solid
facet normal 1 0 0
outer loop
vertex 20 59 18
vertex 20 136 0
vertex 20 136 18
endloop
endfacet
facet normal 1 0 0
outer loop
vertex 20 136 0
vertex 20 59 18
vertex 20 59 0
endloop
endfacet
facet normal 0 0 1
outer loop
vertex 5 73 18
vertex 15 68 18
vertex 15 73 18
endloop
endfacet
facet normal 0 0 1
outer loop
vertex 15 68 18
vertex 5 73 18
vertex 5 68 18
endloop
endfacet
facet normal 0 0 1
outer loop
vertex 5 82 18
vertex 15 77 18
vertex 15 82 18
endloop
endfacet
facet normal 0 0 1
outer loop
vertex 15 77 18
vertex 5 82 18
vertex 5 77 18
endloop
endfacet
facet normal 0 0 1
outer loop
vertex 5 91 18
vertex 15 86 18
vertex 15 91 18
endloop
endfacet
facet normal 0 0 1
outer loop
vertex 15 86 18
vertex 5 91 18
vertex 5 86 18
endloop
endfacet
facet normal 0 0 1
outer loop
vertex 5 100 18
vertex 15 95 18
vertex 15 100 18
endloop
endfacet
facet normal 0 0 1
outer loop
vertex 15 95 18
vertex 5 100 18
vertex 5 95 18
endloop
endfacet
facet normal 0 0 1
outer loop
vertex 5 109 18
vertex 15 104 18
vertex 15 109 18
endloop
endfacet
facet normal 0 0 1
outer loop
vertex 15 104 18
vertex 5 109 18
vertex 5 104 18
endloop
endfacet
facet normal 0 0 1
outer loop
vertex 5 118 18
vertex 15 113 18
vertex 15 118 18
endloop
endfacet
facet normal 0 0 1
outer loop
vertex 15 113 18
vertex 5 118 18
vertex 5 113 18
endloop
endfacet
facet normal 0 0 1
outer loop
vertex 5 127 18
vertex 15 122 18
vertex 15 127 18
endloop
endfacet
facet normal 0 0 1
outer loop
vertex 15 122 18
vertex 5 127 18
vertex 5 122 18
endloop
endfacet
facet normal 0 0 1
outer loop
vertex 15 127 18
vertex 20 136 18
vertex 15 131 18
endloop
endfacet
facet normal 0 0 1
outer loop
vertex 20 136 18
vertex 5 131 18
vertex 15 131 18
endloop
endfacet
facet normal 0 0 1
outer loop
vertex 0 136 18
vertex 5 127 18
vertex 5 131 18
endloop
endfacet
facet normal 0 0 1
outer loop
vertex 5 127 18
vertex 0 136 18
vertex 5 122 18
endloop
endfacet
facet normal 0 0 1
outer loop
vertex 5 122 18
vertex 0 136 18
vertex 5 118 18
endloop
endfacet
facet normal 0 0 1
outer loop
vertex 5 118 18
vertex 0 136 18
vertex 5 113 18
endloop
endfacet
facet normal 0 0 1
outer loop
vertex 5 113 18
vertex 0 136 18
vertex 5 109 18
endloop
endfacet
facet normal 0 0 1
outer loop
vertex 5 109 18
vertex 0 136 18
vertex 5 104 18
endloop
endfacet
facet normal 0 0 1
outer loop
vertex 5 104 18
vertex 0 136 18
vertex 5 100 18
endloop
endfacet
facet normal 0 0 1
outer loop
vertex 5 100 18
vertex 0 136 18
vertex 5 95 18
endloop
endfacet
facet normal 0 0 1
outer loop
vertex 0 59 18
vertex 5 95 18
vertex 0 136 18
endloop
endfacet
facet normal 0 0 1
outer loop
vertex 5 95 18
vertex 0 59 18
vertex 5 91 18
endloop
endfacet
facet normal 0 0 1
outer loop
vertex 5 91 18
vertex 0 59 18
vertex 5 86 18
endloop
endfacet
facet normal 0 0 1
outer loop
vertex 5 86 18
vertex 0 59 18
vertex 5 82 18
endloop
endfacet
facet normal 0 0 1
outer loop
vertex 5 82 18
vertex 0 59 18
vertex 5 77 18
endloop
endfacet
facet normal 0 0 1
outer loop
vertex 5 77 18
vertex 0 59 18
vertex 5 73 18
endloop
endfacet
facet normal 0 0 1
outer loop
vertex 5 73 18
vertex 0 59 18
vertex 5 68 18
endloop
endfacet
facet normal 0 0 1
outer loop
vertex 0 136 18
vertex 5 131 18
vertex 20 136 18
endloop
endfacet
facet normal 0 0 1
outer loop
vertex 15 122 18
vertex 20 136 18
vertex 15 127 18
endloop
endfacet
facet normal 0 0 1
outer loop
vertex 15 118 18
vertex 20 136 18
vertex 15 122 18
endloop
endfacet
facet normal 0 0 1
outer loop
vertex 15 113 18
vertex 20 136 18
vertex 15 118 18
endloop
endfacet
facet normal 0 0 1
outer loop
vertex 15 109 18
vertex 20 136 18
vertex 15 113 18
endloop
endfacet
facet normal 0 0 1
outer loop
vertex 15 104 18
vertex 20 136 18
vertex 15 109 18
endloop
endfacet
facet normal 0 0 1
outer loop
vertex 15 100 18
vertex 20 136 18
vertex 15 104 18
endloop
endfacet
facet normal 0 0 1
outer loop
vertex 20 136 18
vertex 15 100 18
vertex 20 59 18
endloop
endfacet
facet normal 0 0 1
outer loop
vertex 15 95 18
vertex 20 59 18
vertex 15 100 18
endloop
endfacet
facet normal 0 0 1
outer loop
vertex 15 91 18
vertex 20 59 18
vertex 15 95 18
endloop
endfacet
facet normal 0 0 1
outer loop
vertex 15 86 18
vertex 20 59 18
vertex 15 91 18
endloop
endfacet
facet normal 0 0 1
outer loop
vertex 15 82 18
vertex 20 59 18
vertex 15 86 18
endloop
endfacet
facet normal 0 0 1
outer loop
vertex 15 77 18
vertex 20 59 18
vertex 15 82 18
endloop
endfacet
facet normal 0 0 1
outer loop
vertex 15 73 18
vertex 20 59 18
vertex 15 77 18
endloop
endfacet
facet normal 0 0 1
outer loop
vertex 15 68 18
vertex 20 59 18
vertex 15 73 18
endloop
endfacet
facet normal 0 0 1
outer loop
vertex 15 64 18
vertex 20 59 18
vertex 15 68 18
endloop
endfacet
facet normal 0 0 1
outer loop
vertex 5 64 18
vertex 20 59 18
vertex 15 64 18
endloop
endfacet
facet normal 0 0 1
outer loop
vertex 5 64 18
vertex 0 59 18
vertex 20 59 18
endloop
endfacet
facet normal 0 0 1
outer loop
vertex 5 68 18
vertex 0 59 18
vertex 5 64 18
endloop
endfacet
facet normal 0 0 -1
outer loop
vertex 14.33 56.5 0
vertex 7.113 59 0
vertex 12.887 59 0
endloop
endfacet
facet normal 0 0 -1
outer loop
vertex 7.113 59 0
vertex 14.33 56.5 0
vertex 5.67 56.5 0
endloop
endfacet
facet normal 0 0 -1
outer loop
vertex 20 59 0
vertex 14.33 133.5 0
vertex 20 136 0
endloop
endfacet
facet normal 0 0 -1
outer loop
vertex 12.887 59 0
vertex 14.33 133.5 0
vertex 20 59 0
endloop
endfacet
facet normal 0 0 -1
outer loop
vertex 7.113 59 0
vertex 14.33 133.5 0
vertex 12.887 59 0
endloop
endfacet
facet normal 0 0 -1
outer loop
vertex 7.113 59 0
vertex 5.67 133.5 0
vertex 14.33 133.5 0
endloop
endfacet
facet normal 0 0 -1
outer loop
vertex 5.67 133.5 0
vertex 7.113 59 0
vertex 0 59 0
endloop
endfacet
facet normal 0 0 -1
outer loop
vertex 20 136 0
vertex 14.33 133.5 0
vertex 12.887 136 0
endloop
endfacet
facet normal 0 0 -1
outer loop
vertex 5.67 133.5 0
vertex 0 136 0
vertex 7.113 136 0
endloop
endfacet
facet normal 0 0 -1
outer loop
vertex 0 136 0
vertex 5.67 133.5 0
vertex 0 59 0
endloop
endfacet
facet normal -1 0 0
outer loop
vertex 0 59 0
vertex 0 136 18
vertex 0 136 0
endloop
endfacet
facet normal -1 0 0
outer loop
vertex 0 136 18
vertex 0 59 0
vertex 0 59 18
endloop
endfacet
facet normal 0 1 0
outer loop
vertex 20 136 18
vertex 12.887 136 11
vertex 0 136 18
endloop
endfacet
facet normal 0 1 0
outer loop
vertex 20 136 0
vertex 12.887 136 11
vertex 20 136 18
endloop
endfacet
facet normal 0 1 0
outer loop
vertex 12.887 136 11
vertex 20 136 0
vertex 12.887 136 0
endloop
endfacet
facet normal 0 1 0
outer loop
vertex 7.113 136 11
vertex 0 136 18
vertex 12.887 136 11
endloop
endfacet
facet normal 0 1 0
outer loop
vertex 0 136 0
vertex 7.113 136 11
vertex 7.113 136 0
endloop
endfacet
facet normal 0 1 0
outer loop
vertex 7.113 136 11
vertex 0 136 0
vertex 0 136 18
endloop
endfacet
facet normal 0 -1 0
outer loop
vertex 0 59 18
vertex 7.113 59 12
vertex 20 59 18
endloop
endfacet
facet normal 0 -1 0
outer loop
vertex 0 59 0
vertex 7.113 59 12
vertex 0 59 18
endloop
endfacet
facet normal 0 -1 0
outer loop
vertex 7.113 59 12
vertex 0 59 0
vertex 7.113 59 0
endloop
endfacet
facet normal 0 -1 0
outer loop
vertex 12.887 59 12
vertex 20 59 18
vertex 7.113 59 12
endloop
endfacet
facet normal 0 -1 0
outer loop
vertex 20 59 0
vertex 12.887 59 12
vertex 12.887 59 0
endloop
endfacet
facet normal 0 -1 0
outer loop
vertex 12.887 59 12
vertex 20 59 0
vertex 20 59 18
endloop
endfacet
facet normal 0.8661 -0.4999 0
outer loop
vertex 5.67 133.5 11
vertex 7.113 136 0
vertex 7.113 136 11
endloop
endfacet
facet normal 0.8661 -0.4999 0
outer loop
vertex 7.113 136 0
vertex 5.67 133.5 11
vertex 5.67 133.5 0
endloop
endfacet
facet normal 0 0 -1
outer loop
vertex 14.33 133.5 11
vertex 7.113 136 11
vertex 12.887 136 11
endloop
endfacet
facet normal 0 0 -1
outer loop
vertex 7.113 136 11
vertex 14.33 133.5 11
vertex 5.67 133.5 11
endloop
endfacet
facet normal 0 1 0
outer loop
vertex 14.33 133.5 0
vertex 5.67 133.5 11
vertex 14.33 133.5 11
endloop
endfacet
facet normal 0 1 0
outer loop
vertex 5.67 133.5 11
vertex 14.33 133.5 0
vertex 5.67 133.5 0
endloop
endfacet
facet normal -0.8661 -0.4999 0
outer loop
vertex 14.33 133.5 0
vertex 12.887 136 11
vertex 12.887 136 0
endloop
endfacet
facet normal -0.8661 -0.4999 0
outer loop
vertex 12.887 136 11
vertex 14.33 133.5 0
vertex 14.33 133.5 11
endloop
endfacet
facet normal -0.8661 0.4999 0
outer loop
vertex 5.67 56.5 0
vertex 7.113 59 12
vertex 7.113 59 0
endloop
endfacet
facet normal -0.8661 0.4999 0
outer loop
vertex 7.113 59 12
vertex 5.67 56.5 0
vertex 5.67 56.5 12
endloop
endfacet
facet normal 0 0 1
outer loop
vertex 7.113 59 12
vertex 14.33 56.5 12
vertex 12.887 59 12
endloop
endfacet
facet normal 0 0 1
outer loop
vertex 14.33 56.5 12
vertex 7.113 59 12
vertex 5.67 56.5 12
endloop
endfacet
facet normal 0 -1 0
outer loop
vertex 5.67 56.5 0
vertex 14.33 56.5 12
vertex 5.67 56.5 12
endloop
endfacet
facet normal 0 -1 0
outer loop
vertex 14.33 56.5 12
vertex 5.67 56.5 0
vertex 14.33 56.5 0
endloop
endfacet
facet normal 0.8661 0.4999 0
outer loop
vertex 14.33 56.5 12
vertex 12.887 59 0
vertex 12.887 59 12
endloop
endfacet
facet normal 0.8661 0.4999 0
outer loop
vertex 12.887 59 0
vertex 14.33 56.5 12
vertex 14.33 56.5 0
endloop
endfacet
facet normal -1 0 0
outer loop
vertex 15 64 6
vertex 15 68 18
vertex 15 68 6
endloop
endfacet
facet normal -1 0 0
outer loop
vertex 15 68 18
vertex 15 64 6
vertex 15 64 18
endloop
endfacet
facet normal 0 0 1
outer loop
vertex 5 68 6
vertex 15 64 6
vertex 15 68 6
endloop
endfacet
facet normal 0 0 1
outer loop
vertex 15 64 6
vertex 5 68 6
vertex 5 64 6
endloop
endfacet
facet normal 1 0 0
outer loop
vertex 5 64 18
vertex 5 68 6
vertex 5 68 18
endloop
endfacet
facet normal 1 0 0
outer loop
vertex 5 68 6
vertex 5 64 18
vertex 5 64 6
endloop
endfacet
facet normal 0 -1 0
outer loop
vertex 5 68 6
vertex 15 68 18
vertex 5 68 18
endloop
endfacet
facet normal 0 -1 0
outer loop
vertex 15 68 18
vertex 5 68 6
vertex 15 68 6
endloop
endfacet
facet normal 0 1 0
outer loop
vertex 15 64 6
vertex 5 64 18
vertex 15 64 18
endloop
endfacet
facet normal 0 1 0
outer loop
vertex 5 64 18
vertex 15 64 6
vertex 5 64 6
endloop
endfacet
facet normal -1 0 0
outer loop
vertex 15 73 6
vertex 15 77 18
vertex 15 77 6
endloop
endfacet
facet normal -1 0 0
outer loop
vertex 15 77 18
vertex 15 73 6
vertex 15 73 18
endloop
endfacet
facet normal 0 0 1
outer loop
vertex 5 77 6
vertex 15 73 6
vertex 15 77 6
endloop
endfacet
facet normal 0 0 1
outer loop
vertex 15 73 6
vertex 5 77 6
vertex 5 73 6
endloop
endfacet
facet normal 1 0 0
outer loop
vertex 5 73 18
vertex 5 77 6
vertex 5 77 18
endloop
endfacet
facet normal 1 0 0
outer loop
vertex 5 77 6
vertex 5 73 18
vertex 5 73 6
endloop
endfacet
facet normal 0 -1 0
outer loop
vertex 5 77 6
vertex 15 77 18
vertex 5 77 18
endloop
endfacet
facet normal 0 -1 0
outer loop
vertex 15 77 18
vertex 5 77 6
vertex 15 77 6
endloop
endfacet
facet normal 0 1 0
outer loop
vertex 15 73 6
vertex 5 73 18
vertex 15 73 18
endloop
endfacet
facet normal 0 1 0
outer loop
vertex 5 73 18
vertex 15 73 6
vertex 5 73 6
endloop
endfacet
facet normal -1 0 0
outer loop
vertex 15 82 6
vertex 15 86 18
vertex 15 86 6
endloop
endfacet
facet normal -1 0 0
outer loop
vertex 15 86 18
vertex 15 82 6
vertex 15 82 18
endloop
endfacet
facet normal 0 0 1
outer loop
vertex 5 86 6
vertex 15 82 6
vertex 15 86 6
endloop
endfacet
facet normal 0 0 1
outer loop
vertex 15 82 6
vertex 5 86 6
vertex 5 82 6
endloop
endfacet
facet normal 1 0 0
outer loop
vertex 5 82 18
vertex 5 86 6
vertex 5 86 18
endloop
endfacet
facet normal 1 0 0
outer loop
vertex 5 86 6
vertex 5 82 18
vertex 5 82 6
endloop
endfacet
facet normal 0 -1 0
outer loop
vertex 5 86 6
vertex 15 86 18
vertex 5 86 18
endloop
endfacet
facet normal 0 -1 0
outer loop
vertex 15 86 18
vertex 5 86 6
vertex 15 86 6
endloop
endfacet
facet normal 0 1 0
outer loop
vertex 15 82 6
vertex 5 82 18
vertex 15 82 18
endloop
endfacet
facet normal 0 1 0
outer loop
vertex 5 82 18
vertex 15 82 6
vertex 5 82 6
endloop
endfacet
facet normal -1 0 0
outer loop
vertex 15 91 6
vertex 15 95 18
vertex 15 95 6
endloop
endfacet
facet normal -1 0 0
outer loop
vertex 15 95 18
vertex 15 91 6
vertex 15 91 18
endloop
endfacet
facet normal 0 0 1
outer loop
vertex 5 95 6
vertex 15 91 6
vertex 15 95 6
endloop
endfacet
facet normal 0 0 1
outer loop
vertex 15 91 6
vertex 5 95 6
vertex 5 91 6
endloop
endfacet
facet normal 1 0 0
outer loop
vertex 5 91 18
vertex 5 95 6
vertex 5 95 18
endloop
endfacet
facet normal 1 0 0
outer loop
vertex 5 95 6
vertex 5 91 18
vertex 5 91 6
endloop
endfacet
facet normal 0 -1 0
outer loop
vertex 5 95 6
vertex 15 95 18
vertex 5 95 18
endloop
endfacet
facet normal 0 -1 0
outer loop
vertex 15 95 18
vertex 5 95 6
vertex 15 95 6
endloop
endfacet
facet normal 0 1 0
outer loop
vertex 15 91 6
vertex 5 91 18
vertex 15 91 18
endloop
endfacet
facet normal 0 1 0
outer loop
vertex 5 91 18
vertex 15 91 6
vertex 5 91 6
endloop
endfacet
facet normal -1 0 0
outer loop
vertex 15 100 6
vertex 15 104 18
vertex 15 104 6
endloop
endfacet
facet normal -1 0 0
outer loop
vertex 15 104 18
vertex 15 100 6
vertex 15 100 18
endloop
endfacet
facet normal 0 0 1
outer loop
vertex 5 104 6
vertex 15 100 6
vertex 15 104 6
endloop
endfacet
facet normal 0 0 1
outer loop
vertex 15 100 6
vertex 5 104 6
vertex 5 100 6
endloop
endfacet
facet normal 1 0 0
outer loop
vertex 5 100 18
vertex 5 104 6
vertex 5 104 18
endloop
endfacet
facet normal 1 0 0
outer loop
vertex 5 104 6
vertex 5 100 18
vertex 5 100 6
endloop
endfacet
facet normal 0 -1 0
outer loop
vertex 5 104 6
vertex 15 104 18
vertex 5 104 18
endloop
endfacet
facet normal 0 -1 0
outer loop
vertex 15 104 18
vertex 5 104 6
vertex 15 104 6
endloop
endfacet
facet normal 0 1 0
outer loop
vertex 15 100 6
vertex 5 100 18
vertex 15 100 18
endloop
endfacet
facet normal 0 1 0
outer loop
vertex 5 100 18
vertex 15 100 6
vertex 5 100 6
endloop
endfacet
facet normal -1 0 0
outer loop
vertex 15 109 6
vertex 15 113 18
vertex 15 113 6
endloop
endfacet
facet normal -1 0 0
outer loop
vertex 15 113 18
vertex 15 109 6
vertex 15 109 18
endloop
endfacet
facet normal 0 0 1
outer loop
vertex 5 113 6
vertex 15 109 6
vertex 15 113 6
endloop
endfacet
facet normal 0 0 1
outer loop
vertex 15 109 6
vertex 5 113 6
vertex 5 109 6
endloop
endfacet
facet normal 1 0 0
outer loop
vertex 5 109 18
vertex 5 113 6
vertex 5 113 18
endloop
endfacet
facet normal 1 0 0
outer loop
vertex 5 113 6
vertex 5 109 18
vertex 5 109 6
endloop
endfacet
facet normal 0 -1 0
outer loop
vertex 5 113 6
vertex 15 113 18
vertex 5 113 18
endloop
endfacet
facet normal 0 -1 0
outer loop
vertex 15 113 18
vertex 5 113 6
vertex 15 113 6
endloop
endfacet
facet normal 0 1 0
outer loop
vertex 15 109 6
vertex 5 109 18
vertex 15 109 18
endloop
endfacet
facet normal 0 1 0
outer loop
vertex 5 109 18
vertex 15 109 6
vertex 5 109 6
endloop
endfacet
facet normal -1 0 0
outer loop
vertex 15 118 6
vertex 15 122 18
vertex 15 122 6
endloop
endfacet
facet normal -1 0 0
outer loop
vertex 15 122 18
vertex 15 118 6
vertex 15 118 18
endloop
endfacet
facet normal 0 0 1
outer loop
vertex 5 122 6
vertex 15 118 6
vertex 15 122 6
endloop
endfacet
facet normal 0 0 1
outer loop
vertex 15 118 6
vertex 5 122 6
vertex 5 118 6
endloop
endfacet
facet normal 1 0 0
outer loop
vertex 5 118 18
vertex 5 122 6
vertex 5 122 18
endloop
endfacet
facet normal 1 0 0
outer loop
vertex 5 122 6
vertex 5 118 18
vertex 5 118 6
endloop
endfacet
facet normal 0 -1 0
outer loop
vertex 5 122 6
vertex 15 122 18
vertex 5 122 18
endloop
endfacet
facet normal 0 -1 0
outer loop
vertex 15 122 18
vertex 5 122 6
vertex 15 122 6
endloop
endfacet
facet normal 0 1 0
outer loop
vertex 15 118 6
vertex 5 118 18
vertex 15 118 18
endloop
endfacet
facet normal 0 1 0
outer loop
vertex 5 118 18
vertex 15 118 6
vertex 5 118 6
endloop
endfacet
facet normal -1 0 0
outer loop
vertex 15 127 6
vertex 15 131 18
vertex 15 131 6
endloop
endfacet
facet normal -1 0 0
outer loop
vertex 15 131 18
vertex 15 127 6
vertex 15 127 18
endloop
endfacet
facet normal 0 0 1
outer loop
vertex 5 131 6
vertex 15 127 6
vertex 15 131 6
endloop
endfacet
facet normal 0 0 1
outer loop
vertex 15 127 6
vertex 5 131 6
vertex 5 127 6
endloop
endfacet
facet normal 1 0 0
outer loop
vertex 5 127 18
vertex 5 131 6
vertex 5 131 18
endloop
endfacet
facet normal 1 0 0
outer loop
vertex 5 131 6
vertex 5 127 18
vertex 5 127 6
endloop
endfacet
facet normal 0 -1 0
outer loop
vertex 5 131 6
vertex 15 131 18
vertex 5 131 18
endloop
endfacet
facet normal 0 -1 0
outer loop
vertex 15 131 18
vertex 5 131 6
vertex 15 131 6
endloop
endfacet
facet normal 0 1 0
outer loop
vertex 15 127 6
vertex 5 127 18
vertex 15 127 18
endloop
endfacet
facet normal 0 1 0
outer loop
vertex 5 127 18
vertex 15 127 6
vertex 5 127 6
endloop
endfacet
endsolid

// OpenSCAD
/* 
    scalable-usb-holder is a 3D scalable usb holder model
    
    Copyright (C) 2017  jonellrz

    This program is free software: you can redistribute it and/or modify
    it under the terms of the GNU General Public License as published by
    the Free Software Foundation, either version 3 of the License, or
    (at your option) any later version.

    This program is distributed in the hope that it will be useful,
    but WITHOUT ANY WARRANTY; without even the implied warranty of
    MERCHANTABILITY or FITNESS FOR A PARTICULAR PURPOSE.  See the
    GNU General Public License for more details.

    You should have received a copy of the GNU General Public License
    along with this program.  If not, see <http://www.gnu.org/licenses/>.
*/

module base(cantidad=6) {
   altura=18;
   ancho=20;
   margen = 5;
   gordo = 4;
   largo = cantidad * gordo + ((cantidad+1) * margen);

    difference() {
        union() {
            difference() {
               cube([ancho,largo,altura]);
               translate([(ancho/2),largo,-1])
                rotate([0,0,90])
                cylinder(r=(ancho/4), h=(altura/1.5), $fn=3);
            }
            translate([(ancho/2),0,0])
                rotate([0,0,90])
                cylinder(r=(ancho/4), h=(altura/1.5), $fn=3);
        }

        //distancia = 9;
        translate([0, margen, 0])
            for (i=[0:cantidad-1]) {
              translate([(ancho/4), i*(margen+gordo), (altura/3)]) cube([(ancho/2), gordo, altura]);
            }

    }
}

color("MEDIUMTURQUOISE")
translate([0, 59, 0])
base(cantidad=8);

/*
color("SPRINGGREEN")
base(cantidad=6);

color("TOMATO")
translate([0, -32, 0])
base(cantidad=3);
*/
